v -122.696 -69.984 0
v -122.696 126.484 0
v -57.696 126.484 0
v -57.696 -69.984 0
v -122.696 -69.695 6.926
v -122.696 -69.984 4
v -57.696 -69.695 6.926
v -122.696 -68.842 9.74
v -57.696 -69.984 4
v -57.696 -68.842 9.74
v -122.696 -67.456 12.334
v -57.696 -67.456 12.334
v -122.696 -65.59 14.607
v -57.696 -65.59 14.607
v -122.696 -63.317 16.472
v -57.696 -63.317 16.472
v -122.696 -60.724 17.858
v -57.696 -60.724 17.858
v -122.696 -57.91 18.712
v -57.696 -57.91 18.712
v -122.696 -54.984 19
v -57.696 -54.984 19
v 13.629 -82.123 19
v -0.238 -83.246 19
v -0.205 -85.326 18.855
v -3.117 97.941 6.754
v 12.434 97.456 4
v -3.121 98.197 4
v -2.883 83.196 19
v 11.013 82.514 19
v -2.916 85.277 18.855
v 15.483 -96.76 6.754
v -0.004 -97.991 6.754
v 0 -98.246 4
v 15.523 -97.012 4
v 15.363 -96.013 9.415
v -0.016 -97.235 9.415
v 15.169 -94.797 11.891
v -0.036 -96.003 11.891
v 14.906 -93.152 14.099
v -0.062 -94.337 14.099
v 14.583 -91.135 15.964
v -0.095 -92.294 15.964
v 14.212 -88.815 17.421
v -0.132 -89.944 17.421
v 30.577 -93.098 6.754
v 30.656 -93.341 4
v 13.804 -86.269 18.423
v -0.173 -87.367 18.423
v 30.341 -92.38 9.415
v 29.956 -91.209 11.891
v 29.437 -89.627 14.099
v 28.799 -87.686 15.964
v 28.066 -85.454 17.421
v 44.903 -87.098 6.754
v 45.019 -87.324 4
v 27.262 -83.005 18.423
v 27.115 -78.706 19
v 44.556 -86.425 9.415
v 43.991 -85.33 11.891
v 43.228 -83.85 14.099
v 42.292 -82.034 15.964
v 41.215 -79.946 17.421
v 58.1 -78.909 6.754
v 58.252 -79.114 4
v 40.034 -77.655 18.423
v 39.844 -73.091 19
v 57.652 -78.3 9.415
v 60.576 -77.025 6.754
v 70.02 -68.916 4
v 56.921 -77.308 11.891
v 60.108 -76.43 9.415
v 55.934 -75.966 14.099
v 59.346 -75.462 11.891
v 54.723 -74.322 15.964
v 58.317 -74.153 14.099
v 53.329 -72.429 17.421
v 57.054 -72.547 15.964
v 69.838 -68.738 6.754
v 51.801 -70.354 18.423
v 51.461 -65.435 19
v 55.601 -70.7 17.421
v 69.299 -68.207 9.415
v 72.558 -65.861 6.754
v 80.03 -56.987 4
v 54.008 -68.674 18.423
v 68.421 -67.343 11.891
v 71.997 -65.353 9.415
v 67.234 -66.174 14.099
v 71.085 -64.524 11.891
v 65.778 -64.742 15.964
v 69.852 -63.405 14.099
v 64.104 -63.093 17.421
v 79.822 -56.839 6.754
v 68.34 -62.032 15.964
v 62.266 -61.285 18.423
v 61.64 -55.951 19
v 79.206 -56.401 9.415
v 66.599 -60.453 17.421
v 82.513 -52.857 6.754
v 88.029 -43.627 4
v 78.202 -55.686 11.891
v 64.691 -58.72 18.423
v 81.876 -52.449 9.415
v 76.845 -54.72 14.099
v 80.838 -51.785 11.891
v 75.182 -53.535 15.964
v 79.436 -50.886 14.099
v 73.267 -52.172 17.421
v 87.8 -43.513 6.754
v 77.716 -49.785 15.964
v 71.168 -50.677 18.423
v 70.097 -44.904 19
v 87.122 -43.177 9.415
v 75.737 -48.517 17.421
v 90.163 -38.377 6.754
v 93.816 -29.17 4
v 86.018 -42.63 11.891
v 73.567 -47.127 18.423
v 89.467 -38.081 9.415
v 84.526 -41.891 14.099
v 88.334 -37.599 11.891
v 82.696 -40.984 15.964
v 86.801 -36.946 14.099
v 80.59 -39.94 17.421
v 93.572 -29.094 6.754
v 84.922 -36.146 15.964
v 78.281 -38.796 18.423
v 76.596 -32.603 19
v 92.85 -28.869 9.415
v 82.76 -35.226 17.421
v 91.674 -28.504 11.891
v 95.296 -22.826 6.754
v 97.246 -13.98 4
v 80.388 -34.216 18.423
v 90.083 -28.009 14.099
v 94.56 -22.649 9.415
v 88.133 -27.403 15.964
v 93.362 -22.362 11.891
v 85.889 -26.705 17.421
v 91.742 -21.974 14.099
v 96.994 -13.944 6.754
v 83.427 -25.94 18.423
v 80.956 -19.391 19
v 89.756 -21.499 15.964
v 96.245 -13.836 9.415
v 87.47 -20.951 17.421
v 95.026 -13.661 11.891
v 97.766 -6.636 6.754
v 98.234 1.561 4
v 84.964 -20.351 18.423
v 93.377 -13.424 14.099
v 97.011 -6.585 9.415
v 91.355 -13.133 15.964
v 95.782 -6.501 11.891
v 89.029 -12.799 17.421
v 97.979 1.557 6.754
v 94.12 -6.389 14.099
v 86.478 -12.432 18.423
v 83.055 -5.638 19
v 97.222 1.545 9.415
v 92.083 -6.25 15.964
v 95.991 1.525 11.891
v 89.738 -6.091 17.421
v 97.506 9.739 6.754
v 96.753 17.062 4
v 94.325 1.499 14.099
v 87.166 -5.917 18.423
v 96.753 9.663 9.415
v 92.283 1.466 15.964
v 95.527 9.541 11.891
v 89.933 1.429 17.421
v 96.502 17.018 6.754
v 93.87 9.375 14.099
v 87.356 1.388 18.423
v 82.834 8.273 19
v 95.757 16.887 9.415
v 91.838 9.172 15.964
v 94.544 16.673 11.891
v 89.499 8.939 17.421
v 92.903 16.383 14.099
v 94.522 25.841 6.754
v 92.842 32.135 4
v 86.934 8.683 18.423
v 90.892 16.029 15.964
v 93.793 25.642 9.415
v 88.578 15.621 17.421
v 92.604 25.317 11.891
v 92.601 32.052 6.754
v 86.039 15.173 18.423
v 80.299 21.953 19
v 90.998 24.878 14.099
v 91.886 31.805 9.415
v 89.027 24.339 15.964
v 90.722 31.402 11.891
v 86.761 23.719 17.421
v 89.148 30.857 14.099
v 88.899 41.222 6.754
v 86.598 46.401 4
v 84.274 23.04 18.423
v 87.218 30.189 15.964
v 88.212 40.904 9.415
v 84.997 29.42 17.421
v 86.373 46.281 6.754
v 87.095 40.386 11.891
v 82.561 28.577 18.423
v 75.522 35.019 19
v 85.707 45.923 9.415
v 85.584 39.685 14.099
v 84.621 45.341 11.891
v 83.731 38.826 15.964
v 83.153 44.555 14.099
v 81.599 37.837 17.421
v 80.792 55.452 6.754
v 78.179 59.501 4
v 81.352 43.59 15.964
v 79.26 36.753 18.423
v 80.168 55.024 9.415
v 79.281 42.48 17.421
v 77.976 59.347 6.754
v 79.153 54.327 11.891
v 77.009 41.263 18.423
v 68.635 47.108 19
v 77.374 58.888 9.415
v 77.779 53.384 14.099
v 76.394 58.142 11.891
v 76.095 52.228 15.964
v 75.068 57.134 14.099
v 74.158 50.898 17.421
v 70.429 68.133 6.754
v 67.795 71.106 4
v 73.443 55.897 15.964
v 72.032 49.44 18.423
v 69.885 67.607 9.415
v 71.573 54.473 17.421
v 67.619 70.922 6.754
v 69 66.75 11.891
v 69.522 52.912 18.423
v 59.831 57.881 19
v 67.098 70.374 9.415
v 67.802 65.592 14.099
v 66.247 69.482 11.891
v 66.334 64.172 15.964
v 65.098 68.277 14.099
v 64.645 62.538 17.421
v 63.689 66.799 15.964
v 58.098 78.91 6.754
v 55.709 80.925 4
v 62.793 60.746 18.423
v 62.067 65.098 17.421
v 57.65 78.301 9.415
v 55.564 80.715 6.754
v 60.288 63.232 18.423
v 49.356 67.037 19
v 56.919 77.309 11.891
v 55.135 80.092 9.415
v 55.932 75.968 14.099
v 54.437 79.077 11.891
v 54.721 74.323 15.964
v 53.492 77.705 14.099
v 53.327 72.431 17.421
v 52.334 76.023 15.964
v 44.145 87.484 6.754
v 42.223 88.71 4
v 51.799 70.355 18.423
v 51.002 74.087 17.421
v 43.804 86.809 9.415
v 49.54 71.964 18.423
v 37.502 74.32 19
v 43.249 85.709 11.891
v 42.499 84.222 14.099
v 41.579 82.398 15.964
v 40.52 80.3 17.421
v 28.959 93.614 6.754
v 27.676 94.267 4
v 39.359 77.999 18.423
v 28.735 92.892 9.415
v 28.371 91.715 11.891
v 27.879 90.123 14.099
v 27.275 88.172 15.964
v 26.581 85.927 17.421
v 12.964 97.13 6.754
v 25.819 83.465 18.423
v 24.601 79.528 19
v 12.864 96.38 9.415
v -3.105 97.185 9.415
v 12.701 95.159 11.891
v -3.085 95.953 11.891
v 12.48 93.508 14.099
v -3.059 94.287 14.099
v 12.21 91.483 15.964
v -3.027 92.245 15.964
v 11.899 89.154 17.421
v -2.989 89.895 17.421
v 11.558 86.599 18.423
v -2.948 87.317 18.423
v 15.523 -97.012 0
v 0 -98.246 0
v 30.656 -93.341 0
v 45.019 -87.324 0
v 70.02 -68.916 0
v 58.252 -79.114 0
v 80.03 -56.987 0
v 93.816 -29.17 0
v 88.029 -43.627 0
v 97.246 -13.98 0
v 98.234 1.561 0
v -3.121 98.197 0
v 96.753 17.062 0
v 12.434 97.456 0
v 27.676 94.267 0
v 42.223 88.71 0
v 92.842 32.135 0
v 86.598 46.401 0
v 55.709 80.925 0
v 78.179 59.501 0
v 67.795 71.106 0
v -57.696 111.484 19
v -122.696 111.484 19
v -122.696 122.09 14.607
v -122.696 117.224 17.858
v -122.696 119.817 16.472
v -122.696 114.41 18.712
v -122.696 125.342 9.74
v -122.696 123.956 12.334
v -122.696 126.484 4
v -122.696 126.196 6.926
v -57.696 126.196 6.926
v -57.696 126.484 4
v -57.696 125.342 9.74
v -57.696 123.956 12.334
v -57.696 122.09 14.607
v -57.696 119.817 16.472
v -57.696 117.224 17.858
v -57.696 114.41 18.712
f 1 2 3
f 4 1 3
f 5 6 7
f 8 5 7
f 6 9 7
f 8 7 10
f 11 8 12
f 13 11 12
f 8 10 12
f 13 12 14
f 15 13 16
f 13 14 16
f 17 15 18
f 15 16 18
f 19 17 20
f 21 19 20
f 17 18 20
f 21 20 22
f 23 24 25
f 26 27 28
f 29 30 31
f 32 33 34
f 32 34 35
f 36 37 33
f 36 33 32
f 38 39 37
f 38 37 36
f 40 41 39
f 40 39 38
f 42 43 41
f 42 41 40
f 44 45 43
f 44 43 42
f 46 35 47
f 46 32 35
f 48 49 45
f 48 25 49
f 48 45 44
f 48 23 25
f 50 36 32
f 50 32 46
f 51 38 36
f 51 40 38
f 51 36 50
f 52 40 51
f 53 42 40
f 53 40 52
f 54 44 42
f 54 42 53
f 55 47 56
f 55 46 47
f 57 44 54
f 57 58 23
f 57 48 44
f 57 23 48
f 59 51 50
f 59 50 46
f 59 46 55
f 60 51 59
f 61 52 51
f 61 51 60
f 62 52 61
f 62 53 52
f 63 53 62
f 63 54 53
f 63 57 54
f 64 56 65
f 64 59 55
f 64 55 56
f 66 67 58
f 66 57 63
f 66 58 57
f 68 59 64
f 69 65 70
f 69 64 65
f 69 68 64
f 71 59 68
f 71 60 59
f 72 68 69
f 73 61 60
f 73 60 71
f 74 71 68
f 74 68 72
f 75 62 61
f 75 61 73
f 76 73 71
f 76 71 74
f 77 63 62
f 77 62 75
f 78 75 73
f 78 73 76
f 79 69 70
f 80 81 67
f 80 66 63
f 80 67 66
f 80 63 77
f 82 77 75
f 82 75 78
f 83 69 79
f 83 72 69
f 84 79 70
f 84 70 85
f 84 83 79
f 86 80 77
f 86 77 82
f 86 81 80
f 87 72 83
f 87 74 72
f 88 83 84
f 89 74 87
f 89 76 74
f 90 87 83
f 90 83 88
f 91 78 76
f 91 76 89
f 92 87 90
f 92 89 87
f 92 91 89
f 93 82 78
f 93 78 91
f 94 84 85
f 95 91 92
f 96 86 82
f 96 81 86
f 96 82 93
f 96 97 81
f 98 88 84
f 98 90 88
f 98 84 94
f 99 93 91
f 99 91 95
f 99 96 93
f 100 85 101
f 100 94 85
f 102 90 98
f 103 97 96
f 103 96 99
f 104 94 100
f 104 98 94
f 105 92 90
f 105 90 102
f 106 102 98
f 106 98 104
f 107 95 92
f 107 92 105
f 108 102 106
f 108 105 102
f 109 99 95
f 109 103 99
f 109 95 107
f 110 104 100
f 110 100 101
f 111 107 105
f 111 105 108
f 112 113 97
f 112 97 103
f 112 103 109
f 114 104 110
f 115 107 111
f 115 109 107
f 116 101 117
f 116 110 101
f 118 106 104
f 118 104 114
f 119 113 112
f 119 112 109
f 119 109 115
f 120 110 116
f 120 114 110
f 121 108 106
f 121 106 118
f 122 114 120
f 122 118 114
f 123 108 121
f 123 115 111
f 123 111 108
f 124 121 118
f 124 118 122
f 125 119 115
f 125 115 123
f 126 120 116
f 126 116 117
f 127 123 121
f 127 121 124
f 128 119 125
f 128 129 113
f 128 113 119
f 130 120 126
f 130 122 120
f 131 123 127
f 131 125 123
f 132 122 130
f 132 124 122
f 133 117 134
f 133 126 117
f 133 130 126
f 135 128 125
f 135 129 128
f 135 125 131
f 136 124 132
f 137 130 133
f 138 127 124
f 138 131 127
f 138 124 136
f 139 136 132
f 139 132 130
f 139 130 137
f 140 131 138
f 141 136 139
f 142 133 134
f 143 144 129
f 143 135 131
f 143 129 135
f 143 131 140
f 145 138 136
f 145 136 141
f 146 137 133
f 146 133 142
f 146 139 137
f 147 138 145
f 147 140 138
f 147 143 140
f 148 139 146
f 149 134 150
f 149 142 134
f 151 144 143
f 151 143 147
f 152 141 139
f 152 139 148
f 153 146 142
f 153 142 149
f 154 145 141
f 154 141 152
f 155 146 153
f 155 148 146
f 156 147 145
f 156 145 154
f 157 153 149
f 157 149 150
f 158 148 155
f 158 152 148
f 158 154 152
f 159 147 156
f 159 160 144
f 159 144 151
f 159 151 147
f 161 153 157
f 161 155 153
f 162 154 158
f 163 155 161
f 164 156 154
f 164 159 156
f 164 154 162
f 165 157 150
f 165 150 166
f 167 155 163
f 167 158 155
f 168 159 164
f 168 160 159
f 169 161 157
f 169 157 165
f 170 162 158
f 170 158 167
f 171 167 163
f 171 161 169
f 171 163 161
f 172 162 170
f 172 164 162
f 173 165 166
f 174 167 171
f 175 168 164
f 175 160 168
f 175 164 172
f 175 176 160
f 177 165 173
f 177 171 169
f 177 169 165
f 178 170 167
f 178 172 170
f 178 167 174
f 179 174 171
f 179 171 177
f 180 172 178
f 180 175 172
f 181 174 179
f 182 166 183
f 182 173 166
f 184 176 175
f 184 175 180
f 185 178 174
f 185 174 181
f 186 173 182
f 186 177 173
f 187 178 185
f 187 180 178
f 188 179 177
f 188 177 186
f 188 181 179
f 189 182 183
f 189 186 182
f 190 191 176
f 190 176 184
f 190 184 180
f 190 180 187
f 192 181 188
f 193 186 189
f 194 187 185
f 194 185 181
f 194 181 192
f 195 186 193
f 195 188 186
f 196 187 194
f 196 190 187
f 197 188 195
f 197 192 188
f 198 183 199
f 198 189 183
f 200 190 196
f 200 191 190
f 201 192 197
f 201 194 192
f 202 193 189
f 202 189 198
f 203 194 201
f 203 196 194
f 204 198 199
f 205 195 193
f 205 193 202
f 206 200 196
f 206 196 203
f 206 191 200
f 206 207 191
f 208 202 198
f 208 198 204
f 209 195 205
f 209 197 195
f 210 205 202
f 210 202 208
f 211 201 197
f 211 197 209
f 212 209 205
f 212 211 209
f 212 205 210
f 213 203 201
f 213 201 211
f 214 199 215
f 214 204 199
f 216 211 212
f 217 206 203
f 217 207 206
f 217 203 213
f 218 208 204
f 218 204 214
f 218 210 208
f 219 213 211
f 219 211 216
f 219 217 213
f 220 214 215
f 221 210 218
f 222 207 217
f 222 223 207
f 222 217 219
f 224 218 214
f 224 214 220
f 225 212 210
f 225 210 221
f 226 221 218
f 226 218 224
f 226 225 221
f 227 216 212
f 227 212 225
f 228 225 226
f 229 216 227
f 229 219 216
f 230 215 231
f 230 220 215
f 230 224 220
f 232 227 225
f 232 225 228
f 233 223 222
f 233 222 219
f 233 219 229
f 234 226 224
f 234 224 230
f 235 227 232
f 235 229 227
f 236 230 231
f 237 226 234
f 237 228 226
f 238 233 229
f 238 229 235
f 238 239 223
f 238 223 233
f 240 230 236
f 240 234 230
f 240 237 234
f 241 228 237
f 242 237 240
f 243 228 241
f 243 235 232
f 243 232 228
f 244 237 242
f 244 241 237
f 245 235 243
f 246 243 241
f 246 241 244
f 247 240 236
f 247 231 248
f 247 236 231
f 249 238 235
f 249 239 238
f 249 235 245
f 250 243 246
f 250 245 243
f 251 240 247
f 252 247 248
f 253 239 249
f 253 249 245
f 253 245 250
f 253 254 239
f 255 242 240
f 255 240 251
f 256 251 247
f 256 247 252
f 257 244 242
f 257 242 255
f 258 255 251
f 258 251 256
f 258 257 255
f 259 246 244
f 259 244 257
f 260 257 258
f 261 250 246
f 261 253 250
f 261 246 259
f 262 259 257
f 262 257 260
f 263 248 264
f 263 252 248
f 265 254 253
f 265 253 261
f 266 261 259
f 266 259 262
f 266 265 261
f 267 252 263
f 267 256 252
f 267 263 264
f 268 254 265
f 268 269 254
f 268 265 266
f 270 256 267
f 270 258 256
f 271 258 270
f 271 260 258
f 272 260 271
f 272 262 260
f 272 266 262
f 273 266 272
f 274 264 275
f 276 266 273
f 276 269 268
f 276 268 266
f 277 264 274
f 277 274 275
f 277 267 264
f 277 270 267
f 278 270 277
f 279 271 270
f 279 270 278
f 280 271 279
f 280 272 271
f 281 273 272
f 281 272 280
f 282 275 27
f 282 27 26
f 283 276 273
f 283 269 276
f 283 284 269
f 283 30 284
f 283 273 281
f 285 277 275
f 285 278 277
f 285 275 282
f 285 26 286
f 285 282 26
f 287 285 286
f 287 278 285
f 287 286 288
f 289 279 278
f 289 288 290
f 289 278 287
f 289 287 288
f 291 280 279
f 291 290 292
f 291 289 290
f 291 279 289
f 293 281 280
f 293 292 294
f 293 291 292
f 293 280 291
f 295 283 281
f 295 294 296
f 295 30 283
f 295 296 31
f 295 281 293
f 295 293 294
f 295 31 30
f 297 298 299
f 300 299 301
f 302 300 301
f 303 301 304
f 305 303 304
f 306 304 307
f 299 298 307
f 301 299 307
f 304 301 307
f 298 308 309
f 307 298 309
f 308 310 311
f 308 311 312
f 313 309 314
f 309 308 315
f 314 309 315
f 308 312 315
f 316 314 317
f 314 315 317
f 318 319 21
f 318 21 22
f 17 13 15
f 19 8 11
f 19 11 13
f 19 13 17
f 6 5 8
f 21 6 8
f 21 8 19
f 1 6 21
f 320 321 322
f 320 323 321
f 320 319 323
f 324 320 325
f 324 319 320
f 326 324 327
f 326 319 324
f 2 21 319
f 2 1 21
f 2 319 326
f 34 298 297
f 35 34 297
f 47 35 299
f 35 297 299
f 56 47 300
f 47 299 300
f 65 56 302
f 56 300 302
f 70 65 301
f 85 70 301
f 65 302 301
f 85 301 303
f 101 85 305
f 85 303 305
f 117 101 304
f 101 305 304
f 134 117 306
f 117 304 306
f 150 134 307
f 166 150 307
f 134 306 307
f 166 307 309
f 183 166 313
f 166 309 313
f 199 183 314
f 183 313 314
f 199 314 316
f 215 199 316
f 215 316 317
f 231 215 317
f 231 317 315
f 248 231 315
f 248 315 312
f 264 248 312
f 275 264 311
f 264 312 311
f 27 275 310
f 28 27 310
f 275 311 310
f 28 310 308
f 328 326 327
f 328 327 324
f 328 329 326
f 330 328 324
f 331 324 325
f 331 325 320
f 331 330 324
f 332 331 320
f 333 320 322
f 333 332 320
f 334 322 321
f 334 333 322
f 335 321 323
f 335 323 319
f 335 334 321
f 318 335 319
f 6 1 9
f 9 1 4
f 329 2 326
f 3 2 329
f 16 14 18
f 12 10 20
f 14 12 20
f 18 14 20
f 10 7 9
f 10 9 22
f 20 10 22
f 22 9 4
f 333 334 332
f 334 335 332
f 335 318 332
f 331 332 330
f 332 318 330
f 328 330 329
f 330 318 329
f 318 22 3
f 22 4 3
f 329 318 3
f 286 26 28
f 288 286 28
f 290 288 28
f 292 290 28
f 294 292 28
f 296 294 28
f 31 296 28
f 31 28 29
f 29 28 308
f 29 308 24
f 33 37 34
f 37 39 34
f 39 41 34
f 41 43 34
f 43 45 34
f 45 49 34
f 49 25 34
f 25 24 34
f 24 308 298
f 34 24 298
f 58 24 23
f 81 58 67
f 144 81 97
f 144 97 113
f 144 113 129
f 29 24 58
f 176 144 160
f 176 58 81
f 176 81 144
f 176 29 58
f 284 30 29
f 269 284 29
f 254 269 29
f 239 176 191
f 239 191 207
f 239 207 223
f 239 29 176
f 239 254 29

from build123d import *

# Parameters (mm, degrees)
F1_DEPTH = 19
F2_W     = 65
F2_H     = 196.4674
F3_DEPTH = 19
F4_R     = 15
F4_2_R   = 15


with BuildPart() as f1:
    # F0 (on Top) → F1 (new body)
    with BuildSketch(Plane.XY):
        with BuildLine():
            ThreePointArc((0, -98.246098), (98.2337, 1.560734), (-3.121074, 98.19651))
            Line((-3.121074, 98.19651), (0, -98.246098))
        make_face()
    extrude(amount=F1_DEPTH)

    # F4#2
    f4_2_edges = [f1.edges().sort_by_distance(p)[0] for p in [
        (98.2337, 1.560734, 19),
    ]]
    fillet(f4_2_edges, radius=F4_2_R)


with BuildPart() as f3:
    # F2 (on Top) → F3 (new body)
    with BuildSketch(Plane.XY):
        with Locations((-90.196117, 28.250121)):
            Rectangle(F2_W, F2_H)
    extrude(amount=F3_DEPTH)

    # F4
    f4_edges = [f3.edges().sort_by_distance(p)[0] for p in [
        (-90.196117, 126.483821, 19),
        (-90.196117, -69.983579, 19),
    ]]
    fillet(f4_edges, radius=F4_R)


solid = Compound([f1.part, f3.part])
